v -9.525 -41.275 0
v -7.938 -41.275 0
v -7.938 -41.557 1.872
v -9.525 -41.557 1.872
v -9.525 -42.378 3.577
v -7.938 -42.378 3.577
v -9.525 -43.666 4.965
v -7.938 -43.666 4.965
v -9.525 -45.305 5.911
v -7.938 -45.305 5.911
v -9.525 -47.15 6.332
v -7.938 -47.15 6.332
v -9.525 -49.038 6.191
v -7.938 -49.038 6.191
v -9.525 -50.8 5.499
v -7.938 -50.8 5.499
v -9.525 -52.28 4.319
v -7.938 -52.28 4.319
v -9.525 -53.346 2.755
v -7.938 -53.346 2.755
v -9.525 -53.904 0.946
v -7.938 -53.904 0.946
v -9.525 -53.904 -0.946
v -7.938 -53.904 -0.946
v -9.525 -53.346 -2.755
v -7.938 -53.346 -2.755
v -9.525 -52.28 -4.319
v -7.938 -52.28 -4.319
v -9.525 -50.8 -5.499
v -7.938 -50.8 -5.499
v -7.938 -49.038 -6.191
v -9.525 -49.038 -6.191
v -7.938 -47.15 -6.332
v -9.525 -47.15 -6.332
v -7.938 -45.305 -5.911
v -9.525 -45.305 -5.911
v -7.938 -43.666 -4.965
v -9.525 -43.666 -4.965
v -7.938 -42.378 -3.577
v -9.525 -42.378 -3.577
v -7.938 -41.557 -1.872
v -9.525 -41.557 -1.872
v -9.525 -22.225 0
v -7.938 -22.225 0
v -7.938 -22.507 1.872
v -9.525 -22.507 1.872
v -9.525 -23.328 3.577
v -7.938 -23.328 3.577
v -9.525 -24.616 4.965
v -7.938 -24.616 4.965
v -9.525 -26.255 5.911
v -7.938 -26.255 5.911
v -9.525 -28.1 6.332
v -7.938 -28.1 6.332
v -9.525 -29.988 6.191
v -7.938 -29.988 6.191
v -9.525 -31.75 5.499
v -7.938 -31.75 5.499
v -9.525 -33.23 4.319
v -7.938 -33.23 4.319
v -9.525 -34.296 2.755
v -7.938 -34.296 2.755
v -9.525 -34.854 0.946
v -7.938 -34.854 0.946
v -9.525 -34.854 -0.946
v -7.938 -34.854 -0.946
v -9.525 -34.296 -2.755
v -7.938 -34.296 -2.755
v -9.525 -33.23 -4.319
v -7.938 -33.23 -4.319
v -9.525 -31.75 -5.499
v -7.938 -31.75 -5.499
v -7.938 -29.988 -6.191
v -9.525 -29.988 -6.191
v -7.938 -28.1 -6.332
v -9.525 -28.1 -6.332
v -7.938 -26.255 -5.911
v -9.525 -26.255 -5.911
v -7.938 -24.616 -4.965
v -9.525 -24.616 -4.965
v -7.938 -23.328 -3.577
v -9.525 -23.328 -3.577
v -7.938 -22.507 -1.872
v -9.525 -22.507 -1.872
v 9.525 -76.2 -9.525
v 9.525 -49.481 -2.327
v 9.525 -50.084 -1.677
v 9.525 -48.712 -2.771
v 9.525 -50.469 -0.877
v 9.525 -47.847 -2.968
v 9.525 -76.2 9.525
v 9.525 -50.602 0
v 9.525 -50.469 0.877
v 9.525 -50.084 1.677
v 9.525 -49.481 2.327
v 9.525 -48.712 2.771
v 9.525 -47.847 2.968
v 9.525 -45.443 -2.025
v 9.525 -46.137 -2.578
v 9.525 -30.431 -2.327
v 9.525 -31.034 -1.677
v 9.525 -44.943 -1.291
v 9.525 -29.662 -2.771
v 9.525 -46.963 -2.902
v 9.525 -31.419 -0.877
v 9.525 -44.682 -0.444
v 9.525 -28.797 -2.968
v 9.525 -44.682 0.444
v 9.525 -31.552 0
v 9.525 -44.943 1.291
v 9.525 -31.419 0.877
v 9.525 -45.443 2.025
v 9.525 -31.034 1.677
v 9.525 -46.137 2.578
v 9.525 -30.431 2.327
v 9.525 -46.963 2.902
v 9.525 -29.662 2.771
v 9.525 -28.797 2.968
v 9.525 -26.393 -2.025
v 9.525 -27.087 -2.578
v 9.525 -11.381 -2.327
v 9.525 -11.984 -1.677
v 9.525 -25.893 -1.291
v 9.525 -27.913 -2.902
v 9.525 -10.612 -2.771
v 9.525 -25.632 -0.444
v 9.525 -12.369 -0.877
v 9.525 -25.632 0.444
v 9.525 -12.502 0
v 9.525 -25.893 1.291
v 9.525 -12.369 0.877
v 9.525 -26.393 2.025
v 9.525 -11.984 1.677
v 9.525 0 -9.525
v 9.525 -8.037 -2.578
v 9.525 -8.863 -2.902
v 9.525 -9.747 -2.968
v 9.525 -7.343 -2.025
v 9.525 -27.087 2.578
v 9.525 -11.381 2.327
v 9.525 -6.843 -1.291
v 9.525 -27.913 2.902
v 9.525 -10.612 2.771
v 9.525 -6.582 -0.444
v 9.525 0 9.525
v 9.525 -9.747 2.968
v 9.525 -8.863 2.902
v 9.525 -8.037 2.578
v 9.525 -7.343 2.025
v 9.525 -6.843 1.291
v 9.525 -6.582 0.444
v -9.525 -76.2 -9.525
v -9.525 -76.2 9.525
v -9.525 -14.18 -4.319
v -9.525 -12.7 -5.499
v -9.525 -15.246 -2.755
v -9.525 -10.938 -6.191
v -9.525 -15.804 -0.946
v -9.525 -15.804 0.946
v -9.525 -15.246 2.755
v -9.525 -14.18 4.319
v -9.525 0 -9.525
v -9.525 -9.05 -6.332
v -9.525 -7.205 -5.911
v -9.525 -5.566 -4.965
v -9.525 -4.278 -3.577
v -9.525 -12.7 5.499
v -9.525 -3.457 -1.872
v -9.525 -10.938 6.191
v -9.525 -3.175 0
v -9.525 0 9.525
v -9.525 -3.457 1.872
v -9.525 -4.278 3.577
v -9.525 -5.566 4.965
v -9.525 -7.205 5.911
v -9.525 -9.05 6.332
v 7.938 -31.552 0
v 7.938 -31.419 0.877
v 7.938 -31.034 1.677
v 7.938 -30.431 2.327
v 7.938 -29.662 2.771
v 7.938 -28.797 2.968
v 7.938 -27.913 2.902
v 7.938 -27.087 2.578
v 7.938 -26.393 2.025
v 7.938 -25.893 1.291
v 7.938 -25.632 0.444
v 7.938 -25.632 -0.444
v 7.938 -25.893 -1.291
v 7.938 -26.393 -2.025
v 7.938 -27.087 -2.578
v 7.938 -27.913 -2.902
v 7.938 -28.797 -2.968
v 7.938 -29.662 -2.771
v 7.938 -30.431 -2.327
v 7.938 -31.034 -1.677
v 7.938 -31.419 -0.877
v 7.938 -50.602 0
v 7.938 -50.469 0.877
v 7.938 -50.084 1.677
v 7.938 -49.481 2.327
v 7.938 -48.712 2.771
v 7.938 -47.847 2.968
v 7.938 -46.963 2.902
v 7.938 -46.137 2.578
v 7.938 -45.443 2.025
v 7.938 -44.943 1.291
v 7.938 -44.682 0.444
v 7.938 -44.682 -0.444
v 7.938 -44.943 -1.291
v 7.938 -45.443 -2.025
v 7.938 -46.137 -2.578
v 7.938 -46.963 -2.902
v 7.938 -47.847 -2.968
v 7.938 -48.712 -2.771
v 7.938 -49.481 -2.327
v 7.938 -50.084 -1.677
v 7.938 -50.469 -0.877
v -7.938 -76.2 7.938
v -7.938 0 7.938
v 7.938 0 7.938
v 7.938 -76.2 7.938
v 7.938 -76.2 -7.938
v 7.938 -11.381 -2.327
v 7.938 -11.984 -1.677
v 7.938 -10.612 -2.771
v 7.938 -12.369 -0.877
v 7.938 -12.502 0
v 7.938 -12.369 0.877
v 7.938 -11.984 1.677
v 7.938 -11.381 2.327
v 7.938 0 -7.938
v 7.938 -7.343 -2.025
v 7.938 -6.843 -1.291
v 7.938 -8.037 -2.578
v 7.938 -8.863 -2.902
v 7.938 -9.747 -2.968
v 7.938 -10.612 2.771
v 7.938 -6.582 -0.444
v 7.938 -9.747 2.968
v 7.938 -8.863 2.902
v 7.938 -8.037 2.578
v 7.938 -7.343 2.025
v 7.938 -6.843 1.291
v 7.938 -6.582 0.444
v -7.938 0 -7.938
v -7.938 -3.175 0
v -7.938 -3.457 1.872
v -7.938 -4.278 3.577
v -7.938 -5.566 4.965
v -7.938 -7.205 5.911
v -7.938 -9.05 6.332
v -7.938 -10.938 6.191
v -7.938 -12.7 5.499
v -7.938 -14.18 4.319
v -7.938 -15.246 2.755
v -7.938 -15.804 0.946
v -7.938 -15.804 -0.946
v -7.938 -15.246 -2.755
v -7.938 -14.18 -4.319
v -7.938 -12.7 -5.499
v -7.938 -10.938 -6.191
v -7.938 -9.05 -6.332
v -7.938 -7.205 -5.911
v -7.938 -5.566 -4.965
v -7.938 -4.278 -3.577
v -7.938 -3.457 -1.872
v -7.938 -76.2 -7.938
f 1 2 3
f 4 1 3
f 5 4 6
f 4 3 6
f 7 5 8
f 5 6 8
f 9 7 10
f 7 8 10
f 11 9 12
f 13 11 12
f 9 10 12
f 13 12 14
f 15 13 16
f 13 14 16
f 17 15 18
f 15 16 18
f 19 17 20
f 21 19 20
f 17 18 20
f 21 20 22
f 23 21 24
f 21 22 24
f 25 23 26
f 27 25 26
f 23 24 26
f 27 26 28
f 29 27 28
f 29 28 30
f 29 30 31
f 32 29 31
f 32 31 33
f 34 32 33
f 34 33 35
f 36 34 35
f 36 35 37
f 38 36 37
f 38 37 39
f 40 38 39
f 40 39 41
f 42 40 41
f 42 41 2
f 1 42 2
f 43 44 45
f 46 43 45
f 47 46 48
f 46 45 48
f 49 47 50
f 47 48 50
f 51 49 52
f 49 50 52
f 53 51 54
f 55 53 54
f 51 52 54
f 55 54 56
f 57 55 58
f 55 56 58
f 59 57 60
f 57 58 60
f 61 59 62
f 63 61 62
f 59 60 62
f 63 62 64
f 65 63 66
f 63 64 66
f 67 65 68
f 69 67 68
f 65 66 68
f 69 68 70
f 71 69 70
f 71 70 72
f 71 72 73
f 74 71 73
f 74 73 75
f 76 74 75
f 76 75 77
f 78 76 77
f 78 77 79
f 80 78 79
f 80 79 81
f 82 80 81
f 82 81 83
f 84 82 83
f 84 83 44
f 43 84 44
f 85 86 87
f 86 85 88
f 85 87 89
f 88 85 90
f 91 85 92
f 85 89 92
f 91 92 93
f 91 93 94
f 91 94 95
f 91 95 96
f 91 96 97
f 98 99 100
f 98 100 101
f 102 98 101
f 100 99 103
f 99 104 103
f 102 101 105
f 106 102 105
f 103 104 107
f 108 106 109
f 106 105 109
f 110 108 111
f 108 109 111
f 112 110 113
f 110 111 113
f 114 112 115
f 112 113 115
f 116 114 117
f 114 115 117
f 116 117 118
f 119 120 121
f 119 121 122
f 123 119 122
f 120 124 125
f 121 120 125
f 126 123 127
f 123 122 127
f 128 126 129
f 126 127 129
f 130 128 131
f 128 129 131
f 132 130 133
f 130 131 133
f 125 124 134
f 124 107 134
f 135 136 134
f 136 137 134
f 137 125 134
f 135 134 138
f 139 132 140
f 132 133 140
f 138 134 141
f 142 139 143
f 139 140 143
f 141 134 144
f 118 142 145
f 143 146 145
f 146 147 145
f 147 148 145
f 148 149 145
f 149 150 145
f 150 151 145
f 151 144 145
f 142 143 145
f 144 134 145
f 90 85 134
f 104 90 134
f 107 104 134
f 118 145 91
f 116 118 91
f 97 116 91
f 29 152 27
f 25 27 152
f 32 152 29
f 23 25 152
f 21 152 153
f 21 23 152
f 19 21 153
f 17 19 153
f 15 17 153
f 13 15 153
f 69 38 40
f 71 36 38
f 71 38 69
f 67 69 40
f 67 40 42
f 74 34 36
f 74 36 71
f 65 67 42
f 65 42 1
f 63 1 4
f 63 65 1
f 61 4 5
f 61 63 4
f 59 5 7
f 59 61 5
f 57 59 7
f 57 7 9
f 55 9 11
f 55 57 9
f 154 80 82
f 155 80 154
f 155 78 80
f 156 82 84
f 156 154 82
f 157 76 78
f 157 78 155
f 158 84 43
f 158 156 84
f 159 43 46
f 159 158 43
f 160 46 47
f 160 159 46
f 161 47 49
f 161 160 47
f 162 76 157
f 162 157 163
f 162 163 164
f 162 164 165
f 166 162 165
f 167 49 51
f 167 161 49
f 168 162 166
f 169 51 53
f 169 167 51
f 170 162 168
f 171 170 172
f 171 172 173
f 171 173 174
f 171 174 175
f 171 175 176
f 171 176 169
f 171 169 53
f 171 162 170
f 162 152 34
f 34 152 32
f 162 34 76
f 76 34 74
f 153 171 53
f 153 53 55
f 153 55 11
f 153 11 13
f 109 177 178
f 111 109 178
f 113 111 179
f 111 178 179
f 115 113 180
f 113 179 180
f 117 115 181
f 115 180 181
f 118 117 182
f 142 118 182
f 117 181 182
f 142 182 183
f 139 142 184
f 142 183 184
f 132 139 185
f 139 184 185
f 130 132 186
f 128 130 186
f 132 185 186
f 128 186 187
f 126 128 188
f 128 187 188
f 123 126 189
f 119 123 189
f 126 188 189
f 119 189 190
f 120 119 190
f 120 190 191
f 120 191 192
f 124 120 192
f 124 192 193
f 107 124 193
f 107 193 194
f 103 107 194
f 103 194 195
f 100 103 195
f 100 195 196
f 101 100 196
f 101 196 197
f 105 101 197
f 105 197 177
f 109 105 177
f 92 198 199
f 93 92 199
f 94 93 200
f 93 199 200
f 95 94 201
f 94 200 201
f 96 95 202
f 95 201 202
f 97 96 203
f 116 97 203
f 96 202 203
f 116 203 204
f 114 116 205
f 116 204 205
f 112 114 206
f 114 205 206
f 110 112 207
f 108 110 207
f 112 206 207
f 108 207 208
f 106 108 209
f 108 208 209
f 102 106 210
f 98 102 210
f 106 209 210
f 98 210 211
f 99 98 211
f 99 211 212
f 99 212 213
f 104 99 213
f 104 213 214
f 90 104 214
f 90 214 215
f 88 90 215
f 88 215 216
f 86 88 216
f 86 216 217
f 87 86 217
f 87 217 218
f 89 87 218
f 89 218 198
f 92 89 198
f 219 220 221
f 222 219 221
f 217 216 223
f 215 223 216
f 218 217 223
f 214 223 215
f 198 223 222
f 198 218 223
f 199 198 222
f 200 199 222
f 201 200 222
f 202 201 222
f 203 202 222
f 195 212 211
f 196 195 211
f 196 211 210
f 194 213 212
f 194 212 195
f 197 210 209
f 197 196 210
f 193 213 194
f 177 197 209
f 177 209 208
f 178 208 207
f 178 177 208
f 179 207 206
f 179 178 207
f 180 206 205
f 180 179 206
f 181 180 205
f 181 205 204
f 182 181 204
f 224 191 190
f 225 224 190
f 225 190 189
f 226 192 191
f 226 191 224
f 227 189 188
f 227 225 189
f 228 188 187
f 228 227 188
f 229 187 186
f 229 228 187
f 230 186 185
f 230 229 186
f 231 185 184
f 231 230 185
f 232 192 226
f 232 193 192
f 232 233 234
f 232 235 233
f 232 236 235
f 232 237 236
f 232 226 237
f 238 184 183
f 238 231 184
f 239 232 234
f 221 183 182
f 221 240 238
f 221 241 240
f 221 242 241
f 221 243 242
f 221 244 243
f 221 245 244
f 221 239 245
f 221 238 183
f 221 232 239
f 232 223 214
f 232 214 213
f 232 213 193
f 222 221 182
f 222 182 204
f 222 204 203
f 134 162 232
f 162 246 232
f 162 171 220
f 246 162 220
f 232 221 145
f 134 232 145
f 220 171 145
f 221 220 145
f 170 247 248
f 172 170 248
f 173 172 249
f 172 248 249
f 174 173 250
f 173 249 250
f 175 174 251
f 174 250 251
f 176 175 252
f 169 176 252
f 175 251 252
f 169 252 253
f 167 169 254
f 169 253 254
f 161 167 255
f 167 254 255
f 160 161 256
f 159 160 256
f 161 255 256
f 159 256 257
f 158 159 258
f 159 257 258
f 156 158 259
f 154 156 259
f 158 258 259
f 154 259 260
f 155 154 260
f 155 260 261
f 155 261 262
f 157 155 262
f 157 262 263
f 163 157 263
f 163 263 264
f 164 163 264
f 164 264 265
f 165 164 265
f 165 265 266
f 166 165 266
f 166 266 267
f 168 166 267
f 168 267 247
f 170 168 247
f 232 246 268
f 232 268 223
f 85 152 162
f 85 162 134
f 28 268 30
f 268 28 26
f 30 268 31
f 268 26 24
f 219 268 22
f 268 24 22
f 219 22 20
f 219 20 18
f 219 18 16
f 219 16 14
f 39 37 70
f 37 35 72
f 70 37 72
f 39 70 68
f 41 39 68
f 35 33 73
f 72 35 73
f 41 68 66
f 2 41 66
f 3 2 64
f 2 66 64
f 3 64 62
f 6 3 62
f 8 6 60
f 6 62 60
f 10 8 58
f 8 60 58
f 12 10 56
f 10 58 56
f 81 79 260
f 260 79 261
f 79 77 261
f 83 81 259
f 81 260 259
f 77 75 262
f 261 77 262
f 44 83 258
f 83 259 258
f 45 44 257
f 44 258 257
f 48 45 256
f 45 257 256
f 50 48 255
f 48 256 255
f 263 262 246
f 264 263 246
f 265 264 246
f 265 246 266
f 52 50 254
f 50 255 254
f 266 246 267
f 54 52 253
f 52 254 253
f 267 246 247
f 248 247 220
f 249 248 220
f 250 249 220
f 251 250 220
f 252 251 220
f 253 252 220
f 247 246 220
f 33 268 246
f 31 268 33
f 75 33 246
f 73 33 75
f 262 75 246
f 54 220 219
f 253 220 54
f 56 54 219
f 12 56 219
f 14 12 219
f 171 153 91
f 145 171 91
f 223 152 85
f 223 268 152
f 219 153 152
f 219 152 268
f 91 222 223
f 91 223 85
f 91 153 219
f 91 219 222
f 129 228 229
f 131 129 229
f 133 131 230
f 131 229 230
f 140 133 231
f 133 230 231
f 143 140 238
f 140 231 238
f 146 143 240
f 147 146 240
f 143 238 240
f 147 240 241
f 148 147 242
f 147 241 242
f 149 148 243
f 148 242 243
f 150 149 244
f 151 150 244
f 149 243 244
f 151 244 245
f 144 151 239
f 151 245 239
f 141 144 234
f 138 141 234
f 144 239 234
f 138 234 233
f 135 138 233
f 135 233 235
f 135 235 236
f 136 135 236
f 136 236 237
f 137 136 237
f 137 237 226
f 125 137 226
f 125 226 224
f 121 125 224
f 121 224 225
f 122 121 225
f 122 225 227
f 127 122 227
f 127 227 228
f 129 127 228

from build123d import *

# Parameters (mm, degrees)
F0_W     = 19.05
F0_H     = 19.05
F0_W_2   = 15.875
F0_H_2   = 15.875
F1_DEPTH = 76.2
F3_D     = 5.953125
F3_DEPTH = 6.35
F5_D     = 12.7
F5_DEPTH = 6.35


with BuildPart() as f1:
    # F0 (on Front) → F1 (new body)
    with BuildSketch(Plane.XZ):
        Rectangle(F0_W, F0_H)
        Rectangle(F0_W_2, F0_H_2, mode=Mode.SUBTRACT)
    extrude(amount=F1_DEPTH)

    # F3
    with Locations(Plane.YZ.offset(9.525)):
        with Locations((-9.525, 0), (-28.575, 0), (-47.625, 0)):
            Hole(F3_D / 2, depth=F3_DEPTH)

    # F5
    with Locations(Plane(origin=(-9.525, 0, 0), x_dir=(0, -1, 0), z_dir=(-1, 0, 0))):
        with Locations((9.525, 0), (28.575, 0), (47.625, 0)):
            Hole(F5_D / 2, depth=F5_DEPTH)


solid = f1.part
